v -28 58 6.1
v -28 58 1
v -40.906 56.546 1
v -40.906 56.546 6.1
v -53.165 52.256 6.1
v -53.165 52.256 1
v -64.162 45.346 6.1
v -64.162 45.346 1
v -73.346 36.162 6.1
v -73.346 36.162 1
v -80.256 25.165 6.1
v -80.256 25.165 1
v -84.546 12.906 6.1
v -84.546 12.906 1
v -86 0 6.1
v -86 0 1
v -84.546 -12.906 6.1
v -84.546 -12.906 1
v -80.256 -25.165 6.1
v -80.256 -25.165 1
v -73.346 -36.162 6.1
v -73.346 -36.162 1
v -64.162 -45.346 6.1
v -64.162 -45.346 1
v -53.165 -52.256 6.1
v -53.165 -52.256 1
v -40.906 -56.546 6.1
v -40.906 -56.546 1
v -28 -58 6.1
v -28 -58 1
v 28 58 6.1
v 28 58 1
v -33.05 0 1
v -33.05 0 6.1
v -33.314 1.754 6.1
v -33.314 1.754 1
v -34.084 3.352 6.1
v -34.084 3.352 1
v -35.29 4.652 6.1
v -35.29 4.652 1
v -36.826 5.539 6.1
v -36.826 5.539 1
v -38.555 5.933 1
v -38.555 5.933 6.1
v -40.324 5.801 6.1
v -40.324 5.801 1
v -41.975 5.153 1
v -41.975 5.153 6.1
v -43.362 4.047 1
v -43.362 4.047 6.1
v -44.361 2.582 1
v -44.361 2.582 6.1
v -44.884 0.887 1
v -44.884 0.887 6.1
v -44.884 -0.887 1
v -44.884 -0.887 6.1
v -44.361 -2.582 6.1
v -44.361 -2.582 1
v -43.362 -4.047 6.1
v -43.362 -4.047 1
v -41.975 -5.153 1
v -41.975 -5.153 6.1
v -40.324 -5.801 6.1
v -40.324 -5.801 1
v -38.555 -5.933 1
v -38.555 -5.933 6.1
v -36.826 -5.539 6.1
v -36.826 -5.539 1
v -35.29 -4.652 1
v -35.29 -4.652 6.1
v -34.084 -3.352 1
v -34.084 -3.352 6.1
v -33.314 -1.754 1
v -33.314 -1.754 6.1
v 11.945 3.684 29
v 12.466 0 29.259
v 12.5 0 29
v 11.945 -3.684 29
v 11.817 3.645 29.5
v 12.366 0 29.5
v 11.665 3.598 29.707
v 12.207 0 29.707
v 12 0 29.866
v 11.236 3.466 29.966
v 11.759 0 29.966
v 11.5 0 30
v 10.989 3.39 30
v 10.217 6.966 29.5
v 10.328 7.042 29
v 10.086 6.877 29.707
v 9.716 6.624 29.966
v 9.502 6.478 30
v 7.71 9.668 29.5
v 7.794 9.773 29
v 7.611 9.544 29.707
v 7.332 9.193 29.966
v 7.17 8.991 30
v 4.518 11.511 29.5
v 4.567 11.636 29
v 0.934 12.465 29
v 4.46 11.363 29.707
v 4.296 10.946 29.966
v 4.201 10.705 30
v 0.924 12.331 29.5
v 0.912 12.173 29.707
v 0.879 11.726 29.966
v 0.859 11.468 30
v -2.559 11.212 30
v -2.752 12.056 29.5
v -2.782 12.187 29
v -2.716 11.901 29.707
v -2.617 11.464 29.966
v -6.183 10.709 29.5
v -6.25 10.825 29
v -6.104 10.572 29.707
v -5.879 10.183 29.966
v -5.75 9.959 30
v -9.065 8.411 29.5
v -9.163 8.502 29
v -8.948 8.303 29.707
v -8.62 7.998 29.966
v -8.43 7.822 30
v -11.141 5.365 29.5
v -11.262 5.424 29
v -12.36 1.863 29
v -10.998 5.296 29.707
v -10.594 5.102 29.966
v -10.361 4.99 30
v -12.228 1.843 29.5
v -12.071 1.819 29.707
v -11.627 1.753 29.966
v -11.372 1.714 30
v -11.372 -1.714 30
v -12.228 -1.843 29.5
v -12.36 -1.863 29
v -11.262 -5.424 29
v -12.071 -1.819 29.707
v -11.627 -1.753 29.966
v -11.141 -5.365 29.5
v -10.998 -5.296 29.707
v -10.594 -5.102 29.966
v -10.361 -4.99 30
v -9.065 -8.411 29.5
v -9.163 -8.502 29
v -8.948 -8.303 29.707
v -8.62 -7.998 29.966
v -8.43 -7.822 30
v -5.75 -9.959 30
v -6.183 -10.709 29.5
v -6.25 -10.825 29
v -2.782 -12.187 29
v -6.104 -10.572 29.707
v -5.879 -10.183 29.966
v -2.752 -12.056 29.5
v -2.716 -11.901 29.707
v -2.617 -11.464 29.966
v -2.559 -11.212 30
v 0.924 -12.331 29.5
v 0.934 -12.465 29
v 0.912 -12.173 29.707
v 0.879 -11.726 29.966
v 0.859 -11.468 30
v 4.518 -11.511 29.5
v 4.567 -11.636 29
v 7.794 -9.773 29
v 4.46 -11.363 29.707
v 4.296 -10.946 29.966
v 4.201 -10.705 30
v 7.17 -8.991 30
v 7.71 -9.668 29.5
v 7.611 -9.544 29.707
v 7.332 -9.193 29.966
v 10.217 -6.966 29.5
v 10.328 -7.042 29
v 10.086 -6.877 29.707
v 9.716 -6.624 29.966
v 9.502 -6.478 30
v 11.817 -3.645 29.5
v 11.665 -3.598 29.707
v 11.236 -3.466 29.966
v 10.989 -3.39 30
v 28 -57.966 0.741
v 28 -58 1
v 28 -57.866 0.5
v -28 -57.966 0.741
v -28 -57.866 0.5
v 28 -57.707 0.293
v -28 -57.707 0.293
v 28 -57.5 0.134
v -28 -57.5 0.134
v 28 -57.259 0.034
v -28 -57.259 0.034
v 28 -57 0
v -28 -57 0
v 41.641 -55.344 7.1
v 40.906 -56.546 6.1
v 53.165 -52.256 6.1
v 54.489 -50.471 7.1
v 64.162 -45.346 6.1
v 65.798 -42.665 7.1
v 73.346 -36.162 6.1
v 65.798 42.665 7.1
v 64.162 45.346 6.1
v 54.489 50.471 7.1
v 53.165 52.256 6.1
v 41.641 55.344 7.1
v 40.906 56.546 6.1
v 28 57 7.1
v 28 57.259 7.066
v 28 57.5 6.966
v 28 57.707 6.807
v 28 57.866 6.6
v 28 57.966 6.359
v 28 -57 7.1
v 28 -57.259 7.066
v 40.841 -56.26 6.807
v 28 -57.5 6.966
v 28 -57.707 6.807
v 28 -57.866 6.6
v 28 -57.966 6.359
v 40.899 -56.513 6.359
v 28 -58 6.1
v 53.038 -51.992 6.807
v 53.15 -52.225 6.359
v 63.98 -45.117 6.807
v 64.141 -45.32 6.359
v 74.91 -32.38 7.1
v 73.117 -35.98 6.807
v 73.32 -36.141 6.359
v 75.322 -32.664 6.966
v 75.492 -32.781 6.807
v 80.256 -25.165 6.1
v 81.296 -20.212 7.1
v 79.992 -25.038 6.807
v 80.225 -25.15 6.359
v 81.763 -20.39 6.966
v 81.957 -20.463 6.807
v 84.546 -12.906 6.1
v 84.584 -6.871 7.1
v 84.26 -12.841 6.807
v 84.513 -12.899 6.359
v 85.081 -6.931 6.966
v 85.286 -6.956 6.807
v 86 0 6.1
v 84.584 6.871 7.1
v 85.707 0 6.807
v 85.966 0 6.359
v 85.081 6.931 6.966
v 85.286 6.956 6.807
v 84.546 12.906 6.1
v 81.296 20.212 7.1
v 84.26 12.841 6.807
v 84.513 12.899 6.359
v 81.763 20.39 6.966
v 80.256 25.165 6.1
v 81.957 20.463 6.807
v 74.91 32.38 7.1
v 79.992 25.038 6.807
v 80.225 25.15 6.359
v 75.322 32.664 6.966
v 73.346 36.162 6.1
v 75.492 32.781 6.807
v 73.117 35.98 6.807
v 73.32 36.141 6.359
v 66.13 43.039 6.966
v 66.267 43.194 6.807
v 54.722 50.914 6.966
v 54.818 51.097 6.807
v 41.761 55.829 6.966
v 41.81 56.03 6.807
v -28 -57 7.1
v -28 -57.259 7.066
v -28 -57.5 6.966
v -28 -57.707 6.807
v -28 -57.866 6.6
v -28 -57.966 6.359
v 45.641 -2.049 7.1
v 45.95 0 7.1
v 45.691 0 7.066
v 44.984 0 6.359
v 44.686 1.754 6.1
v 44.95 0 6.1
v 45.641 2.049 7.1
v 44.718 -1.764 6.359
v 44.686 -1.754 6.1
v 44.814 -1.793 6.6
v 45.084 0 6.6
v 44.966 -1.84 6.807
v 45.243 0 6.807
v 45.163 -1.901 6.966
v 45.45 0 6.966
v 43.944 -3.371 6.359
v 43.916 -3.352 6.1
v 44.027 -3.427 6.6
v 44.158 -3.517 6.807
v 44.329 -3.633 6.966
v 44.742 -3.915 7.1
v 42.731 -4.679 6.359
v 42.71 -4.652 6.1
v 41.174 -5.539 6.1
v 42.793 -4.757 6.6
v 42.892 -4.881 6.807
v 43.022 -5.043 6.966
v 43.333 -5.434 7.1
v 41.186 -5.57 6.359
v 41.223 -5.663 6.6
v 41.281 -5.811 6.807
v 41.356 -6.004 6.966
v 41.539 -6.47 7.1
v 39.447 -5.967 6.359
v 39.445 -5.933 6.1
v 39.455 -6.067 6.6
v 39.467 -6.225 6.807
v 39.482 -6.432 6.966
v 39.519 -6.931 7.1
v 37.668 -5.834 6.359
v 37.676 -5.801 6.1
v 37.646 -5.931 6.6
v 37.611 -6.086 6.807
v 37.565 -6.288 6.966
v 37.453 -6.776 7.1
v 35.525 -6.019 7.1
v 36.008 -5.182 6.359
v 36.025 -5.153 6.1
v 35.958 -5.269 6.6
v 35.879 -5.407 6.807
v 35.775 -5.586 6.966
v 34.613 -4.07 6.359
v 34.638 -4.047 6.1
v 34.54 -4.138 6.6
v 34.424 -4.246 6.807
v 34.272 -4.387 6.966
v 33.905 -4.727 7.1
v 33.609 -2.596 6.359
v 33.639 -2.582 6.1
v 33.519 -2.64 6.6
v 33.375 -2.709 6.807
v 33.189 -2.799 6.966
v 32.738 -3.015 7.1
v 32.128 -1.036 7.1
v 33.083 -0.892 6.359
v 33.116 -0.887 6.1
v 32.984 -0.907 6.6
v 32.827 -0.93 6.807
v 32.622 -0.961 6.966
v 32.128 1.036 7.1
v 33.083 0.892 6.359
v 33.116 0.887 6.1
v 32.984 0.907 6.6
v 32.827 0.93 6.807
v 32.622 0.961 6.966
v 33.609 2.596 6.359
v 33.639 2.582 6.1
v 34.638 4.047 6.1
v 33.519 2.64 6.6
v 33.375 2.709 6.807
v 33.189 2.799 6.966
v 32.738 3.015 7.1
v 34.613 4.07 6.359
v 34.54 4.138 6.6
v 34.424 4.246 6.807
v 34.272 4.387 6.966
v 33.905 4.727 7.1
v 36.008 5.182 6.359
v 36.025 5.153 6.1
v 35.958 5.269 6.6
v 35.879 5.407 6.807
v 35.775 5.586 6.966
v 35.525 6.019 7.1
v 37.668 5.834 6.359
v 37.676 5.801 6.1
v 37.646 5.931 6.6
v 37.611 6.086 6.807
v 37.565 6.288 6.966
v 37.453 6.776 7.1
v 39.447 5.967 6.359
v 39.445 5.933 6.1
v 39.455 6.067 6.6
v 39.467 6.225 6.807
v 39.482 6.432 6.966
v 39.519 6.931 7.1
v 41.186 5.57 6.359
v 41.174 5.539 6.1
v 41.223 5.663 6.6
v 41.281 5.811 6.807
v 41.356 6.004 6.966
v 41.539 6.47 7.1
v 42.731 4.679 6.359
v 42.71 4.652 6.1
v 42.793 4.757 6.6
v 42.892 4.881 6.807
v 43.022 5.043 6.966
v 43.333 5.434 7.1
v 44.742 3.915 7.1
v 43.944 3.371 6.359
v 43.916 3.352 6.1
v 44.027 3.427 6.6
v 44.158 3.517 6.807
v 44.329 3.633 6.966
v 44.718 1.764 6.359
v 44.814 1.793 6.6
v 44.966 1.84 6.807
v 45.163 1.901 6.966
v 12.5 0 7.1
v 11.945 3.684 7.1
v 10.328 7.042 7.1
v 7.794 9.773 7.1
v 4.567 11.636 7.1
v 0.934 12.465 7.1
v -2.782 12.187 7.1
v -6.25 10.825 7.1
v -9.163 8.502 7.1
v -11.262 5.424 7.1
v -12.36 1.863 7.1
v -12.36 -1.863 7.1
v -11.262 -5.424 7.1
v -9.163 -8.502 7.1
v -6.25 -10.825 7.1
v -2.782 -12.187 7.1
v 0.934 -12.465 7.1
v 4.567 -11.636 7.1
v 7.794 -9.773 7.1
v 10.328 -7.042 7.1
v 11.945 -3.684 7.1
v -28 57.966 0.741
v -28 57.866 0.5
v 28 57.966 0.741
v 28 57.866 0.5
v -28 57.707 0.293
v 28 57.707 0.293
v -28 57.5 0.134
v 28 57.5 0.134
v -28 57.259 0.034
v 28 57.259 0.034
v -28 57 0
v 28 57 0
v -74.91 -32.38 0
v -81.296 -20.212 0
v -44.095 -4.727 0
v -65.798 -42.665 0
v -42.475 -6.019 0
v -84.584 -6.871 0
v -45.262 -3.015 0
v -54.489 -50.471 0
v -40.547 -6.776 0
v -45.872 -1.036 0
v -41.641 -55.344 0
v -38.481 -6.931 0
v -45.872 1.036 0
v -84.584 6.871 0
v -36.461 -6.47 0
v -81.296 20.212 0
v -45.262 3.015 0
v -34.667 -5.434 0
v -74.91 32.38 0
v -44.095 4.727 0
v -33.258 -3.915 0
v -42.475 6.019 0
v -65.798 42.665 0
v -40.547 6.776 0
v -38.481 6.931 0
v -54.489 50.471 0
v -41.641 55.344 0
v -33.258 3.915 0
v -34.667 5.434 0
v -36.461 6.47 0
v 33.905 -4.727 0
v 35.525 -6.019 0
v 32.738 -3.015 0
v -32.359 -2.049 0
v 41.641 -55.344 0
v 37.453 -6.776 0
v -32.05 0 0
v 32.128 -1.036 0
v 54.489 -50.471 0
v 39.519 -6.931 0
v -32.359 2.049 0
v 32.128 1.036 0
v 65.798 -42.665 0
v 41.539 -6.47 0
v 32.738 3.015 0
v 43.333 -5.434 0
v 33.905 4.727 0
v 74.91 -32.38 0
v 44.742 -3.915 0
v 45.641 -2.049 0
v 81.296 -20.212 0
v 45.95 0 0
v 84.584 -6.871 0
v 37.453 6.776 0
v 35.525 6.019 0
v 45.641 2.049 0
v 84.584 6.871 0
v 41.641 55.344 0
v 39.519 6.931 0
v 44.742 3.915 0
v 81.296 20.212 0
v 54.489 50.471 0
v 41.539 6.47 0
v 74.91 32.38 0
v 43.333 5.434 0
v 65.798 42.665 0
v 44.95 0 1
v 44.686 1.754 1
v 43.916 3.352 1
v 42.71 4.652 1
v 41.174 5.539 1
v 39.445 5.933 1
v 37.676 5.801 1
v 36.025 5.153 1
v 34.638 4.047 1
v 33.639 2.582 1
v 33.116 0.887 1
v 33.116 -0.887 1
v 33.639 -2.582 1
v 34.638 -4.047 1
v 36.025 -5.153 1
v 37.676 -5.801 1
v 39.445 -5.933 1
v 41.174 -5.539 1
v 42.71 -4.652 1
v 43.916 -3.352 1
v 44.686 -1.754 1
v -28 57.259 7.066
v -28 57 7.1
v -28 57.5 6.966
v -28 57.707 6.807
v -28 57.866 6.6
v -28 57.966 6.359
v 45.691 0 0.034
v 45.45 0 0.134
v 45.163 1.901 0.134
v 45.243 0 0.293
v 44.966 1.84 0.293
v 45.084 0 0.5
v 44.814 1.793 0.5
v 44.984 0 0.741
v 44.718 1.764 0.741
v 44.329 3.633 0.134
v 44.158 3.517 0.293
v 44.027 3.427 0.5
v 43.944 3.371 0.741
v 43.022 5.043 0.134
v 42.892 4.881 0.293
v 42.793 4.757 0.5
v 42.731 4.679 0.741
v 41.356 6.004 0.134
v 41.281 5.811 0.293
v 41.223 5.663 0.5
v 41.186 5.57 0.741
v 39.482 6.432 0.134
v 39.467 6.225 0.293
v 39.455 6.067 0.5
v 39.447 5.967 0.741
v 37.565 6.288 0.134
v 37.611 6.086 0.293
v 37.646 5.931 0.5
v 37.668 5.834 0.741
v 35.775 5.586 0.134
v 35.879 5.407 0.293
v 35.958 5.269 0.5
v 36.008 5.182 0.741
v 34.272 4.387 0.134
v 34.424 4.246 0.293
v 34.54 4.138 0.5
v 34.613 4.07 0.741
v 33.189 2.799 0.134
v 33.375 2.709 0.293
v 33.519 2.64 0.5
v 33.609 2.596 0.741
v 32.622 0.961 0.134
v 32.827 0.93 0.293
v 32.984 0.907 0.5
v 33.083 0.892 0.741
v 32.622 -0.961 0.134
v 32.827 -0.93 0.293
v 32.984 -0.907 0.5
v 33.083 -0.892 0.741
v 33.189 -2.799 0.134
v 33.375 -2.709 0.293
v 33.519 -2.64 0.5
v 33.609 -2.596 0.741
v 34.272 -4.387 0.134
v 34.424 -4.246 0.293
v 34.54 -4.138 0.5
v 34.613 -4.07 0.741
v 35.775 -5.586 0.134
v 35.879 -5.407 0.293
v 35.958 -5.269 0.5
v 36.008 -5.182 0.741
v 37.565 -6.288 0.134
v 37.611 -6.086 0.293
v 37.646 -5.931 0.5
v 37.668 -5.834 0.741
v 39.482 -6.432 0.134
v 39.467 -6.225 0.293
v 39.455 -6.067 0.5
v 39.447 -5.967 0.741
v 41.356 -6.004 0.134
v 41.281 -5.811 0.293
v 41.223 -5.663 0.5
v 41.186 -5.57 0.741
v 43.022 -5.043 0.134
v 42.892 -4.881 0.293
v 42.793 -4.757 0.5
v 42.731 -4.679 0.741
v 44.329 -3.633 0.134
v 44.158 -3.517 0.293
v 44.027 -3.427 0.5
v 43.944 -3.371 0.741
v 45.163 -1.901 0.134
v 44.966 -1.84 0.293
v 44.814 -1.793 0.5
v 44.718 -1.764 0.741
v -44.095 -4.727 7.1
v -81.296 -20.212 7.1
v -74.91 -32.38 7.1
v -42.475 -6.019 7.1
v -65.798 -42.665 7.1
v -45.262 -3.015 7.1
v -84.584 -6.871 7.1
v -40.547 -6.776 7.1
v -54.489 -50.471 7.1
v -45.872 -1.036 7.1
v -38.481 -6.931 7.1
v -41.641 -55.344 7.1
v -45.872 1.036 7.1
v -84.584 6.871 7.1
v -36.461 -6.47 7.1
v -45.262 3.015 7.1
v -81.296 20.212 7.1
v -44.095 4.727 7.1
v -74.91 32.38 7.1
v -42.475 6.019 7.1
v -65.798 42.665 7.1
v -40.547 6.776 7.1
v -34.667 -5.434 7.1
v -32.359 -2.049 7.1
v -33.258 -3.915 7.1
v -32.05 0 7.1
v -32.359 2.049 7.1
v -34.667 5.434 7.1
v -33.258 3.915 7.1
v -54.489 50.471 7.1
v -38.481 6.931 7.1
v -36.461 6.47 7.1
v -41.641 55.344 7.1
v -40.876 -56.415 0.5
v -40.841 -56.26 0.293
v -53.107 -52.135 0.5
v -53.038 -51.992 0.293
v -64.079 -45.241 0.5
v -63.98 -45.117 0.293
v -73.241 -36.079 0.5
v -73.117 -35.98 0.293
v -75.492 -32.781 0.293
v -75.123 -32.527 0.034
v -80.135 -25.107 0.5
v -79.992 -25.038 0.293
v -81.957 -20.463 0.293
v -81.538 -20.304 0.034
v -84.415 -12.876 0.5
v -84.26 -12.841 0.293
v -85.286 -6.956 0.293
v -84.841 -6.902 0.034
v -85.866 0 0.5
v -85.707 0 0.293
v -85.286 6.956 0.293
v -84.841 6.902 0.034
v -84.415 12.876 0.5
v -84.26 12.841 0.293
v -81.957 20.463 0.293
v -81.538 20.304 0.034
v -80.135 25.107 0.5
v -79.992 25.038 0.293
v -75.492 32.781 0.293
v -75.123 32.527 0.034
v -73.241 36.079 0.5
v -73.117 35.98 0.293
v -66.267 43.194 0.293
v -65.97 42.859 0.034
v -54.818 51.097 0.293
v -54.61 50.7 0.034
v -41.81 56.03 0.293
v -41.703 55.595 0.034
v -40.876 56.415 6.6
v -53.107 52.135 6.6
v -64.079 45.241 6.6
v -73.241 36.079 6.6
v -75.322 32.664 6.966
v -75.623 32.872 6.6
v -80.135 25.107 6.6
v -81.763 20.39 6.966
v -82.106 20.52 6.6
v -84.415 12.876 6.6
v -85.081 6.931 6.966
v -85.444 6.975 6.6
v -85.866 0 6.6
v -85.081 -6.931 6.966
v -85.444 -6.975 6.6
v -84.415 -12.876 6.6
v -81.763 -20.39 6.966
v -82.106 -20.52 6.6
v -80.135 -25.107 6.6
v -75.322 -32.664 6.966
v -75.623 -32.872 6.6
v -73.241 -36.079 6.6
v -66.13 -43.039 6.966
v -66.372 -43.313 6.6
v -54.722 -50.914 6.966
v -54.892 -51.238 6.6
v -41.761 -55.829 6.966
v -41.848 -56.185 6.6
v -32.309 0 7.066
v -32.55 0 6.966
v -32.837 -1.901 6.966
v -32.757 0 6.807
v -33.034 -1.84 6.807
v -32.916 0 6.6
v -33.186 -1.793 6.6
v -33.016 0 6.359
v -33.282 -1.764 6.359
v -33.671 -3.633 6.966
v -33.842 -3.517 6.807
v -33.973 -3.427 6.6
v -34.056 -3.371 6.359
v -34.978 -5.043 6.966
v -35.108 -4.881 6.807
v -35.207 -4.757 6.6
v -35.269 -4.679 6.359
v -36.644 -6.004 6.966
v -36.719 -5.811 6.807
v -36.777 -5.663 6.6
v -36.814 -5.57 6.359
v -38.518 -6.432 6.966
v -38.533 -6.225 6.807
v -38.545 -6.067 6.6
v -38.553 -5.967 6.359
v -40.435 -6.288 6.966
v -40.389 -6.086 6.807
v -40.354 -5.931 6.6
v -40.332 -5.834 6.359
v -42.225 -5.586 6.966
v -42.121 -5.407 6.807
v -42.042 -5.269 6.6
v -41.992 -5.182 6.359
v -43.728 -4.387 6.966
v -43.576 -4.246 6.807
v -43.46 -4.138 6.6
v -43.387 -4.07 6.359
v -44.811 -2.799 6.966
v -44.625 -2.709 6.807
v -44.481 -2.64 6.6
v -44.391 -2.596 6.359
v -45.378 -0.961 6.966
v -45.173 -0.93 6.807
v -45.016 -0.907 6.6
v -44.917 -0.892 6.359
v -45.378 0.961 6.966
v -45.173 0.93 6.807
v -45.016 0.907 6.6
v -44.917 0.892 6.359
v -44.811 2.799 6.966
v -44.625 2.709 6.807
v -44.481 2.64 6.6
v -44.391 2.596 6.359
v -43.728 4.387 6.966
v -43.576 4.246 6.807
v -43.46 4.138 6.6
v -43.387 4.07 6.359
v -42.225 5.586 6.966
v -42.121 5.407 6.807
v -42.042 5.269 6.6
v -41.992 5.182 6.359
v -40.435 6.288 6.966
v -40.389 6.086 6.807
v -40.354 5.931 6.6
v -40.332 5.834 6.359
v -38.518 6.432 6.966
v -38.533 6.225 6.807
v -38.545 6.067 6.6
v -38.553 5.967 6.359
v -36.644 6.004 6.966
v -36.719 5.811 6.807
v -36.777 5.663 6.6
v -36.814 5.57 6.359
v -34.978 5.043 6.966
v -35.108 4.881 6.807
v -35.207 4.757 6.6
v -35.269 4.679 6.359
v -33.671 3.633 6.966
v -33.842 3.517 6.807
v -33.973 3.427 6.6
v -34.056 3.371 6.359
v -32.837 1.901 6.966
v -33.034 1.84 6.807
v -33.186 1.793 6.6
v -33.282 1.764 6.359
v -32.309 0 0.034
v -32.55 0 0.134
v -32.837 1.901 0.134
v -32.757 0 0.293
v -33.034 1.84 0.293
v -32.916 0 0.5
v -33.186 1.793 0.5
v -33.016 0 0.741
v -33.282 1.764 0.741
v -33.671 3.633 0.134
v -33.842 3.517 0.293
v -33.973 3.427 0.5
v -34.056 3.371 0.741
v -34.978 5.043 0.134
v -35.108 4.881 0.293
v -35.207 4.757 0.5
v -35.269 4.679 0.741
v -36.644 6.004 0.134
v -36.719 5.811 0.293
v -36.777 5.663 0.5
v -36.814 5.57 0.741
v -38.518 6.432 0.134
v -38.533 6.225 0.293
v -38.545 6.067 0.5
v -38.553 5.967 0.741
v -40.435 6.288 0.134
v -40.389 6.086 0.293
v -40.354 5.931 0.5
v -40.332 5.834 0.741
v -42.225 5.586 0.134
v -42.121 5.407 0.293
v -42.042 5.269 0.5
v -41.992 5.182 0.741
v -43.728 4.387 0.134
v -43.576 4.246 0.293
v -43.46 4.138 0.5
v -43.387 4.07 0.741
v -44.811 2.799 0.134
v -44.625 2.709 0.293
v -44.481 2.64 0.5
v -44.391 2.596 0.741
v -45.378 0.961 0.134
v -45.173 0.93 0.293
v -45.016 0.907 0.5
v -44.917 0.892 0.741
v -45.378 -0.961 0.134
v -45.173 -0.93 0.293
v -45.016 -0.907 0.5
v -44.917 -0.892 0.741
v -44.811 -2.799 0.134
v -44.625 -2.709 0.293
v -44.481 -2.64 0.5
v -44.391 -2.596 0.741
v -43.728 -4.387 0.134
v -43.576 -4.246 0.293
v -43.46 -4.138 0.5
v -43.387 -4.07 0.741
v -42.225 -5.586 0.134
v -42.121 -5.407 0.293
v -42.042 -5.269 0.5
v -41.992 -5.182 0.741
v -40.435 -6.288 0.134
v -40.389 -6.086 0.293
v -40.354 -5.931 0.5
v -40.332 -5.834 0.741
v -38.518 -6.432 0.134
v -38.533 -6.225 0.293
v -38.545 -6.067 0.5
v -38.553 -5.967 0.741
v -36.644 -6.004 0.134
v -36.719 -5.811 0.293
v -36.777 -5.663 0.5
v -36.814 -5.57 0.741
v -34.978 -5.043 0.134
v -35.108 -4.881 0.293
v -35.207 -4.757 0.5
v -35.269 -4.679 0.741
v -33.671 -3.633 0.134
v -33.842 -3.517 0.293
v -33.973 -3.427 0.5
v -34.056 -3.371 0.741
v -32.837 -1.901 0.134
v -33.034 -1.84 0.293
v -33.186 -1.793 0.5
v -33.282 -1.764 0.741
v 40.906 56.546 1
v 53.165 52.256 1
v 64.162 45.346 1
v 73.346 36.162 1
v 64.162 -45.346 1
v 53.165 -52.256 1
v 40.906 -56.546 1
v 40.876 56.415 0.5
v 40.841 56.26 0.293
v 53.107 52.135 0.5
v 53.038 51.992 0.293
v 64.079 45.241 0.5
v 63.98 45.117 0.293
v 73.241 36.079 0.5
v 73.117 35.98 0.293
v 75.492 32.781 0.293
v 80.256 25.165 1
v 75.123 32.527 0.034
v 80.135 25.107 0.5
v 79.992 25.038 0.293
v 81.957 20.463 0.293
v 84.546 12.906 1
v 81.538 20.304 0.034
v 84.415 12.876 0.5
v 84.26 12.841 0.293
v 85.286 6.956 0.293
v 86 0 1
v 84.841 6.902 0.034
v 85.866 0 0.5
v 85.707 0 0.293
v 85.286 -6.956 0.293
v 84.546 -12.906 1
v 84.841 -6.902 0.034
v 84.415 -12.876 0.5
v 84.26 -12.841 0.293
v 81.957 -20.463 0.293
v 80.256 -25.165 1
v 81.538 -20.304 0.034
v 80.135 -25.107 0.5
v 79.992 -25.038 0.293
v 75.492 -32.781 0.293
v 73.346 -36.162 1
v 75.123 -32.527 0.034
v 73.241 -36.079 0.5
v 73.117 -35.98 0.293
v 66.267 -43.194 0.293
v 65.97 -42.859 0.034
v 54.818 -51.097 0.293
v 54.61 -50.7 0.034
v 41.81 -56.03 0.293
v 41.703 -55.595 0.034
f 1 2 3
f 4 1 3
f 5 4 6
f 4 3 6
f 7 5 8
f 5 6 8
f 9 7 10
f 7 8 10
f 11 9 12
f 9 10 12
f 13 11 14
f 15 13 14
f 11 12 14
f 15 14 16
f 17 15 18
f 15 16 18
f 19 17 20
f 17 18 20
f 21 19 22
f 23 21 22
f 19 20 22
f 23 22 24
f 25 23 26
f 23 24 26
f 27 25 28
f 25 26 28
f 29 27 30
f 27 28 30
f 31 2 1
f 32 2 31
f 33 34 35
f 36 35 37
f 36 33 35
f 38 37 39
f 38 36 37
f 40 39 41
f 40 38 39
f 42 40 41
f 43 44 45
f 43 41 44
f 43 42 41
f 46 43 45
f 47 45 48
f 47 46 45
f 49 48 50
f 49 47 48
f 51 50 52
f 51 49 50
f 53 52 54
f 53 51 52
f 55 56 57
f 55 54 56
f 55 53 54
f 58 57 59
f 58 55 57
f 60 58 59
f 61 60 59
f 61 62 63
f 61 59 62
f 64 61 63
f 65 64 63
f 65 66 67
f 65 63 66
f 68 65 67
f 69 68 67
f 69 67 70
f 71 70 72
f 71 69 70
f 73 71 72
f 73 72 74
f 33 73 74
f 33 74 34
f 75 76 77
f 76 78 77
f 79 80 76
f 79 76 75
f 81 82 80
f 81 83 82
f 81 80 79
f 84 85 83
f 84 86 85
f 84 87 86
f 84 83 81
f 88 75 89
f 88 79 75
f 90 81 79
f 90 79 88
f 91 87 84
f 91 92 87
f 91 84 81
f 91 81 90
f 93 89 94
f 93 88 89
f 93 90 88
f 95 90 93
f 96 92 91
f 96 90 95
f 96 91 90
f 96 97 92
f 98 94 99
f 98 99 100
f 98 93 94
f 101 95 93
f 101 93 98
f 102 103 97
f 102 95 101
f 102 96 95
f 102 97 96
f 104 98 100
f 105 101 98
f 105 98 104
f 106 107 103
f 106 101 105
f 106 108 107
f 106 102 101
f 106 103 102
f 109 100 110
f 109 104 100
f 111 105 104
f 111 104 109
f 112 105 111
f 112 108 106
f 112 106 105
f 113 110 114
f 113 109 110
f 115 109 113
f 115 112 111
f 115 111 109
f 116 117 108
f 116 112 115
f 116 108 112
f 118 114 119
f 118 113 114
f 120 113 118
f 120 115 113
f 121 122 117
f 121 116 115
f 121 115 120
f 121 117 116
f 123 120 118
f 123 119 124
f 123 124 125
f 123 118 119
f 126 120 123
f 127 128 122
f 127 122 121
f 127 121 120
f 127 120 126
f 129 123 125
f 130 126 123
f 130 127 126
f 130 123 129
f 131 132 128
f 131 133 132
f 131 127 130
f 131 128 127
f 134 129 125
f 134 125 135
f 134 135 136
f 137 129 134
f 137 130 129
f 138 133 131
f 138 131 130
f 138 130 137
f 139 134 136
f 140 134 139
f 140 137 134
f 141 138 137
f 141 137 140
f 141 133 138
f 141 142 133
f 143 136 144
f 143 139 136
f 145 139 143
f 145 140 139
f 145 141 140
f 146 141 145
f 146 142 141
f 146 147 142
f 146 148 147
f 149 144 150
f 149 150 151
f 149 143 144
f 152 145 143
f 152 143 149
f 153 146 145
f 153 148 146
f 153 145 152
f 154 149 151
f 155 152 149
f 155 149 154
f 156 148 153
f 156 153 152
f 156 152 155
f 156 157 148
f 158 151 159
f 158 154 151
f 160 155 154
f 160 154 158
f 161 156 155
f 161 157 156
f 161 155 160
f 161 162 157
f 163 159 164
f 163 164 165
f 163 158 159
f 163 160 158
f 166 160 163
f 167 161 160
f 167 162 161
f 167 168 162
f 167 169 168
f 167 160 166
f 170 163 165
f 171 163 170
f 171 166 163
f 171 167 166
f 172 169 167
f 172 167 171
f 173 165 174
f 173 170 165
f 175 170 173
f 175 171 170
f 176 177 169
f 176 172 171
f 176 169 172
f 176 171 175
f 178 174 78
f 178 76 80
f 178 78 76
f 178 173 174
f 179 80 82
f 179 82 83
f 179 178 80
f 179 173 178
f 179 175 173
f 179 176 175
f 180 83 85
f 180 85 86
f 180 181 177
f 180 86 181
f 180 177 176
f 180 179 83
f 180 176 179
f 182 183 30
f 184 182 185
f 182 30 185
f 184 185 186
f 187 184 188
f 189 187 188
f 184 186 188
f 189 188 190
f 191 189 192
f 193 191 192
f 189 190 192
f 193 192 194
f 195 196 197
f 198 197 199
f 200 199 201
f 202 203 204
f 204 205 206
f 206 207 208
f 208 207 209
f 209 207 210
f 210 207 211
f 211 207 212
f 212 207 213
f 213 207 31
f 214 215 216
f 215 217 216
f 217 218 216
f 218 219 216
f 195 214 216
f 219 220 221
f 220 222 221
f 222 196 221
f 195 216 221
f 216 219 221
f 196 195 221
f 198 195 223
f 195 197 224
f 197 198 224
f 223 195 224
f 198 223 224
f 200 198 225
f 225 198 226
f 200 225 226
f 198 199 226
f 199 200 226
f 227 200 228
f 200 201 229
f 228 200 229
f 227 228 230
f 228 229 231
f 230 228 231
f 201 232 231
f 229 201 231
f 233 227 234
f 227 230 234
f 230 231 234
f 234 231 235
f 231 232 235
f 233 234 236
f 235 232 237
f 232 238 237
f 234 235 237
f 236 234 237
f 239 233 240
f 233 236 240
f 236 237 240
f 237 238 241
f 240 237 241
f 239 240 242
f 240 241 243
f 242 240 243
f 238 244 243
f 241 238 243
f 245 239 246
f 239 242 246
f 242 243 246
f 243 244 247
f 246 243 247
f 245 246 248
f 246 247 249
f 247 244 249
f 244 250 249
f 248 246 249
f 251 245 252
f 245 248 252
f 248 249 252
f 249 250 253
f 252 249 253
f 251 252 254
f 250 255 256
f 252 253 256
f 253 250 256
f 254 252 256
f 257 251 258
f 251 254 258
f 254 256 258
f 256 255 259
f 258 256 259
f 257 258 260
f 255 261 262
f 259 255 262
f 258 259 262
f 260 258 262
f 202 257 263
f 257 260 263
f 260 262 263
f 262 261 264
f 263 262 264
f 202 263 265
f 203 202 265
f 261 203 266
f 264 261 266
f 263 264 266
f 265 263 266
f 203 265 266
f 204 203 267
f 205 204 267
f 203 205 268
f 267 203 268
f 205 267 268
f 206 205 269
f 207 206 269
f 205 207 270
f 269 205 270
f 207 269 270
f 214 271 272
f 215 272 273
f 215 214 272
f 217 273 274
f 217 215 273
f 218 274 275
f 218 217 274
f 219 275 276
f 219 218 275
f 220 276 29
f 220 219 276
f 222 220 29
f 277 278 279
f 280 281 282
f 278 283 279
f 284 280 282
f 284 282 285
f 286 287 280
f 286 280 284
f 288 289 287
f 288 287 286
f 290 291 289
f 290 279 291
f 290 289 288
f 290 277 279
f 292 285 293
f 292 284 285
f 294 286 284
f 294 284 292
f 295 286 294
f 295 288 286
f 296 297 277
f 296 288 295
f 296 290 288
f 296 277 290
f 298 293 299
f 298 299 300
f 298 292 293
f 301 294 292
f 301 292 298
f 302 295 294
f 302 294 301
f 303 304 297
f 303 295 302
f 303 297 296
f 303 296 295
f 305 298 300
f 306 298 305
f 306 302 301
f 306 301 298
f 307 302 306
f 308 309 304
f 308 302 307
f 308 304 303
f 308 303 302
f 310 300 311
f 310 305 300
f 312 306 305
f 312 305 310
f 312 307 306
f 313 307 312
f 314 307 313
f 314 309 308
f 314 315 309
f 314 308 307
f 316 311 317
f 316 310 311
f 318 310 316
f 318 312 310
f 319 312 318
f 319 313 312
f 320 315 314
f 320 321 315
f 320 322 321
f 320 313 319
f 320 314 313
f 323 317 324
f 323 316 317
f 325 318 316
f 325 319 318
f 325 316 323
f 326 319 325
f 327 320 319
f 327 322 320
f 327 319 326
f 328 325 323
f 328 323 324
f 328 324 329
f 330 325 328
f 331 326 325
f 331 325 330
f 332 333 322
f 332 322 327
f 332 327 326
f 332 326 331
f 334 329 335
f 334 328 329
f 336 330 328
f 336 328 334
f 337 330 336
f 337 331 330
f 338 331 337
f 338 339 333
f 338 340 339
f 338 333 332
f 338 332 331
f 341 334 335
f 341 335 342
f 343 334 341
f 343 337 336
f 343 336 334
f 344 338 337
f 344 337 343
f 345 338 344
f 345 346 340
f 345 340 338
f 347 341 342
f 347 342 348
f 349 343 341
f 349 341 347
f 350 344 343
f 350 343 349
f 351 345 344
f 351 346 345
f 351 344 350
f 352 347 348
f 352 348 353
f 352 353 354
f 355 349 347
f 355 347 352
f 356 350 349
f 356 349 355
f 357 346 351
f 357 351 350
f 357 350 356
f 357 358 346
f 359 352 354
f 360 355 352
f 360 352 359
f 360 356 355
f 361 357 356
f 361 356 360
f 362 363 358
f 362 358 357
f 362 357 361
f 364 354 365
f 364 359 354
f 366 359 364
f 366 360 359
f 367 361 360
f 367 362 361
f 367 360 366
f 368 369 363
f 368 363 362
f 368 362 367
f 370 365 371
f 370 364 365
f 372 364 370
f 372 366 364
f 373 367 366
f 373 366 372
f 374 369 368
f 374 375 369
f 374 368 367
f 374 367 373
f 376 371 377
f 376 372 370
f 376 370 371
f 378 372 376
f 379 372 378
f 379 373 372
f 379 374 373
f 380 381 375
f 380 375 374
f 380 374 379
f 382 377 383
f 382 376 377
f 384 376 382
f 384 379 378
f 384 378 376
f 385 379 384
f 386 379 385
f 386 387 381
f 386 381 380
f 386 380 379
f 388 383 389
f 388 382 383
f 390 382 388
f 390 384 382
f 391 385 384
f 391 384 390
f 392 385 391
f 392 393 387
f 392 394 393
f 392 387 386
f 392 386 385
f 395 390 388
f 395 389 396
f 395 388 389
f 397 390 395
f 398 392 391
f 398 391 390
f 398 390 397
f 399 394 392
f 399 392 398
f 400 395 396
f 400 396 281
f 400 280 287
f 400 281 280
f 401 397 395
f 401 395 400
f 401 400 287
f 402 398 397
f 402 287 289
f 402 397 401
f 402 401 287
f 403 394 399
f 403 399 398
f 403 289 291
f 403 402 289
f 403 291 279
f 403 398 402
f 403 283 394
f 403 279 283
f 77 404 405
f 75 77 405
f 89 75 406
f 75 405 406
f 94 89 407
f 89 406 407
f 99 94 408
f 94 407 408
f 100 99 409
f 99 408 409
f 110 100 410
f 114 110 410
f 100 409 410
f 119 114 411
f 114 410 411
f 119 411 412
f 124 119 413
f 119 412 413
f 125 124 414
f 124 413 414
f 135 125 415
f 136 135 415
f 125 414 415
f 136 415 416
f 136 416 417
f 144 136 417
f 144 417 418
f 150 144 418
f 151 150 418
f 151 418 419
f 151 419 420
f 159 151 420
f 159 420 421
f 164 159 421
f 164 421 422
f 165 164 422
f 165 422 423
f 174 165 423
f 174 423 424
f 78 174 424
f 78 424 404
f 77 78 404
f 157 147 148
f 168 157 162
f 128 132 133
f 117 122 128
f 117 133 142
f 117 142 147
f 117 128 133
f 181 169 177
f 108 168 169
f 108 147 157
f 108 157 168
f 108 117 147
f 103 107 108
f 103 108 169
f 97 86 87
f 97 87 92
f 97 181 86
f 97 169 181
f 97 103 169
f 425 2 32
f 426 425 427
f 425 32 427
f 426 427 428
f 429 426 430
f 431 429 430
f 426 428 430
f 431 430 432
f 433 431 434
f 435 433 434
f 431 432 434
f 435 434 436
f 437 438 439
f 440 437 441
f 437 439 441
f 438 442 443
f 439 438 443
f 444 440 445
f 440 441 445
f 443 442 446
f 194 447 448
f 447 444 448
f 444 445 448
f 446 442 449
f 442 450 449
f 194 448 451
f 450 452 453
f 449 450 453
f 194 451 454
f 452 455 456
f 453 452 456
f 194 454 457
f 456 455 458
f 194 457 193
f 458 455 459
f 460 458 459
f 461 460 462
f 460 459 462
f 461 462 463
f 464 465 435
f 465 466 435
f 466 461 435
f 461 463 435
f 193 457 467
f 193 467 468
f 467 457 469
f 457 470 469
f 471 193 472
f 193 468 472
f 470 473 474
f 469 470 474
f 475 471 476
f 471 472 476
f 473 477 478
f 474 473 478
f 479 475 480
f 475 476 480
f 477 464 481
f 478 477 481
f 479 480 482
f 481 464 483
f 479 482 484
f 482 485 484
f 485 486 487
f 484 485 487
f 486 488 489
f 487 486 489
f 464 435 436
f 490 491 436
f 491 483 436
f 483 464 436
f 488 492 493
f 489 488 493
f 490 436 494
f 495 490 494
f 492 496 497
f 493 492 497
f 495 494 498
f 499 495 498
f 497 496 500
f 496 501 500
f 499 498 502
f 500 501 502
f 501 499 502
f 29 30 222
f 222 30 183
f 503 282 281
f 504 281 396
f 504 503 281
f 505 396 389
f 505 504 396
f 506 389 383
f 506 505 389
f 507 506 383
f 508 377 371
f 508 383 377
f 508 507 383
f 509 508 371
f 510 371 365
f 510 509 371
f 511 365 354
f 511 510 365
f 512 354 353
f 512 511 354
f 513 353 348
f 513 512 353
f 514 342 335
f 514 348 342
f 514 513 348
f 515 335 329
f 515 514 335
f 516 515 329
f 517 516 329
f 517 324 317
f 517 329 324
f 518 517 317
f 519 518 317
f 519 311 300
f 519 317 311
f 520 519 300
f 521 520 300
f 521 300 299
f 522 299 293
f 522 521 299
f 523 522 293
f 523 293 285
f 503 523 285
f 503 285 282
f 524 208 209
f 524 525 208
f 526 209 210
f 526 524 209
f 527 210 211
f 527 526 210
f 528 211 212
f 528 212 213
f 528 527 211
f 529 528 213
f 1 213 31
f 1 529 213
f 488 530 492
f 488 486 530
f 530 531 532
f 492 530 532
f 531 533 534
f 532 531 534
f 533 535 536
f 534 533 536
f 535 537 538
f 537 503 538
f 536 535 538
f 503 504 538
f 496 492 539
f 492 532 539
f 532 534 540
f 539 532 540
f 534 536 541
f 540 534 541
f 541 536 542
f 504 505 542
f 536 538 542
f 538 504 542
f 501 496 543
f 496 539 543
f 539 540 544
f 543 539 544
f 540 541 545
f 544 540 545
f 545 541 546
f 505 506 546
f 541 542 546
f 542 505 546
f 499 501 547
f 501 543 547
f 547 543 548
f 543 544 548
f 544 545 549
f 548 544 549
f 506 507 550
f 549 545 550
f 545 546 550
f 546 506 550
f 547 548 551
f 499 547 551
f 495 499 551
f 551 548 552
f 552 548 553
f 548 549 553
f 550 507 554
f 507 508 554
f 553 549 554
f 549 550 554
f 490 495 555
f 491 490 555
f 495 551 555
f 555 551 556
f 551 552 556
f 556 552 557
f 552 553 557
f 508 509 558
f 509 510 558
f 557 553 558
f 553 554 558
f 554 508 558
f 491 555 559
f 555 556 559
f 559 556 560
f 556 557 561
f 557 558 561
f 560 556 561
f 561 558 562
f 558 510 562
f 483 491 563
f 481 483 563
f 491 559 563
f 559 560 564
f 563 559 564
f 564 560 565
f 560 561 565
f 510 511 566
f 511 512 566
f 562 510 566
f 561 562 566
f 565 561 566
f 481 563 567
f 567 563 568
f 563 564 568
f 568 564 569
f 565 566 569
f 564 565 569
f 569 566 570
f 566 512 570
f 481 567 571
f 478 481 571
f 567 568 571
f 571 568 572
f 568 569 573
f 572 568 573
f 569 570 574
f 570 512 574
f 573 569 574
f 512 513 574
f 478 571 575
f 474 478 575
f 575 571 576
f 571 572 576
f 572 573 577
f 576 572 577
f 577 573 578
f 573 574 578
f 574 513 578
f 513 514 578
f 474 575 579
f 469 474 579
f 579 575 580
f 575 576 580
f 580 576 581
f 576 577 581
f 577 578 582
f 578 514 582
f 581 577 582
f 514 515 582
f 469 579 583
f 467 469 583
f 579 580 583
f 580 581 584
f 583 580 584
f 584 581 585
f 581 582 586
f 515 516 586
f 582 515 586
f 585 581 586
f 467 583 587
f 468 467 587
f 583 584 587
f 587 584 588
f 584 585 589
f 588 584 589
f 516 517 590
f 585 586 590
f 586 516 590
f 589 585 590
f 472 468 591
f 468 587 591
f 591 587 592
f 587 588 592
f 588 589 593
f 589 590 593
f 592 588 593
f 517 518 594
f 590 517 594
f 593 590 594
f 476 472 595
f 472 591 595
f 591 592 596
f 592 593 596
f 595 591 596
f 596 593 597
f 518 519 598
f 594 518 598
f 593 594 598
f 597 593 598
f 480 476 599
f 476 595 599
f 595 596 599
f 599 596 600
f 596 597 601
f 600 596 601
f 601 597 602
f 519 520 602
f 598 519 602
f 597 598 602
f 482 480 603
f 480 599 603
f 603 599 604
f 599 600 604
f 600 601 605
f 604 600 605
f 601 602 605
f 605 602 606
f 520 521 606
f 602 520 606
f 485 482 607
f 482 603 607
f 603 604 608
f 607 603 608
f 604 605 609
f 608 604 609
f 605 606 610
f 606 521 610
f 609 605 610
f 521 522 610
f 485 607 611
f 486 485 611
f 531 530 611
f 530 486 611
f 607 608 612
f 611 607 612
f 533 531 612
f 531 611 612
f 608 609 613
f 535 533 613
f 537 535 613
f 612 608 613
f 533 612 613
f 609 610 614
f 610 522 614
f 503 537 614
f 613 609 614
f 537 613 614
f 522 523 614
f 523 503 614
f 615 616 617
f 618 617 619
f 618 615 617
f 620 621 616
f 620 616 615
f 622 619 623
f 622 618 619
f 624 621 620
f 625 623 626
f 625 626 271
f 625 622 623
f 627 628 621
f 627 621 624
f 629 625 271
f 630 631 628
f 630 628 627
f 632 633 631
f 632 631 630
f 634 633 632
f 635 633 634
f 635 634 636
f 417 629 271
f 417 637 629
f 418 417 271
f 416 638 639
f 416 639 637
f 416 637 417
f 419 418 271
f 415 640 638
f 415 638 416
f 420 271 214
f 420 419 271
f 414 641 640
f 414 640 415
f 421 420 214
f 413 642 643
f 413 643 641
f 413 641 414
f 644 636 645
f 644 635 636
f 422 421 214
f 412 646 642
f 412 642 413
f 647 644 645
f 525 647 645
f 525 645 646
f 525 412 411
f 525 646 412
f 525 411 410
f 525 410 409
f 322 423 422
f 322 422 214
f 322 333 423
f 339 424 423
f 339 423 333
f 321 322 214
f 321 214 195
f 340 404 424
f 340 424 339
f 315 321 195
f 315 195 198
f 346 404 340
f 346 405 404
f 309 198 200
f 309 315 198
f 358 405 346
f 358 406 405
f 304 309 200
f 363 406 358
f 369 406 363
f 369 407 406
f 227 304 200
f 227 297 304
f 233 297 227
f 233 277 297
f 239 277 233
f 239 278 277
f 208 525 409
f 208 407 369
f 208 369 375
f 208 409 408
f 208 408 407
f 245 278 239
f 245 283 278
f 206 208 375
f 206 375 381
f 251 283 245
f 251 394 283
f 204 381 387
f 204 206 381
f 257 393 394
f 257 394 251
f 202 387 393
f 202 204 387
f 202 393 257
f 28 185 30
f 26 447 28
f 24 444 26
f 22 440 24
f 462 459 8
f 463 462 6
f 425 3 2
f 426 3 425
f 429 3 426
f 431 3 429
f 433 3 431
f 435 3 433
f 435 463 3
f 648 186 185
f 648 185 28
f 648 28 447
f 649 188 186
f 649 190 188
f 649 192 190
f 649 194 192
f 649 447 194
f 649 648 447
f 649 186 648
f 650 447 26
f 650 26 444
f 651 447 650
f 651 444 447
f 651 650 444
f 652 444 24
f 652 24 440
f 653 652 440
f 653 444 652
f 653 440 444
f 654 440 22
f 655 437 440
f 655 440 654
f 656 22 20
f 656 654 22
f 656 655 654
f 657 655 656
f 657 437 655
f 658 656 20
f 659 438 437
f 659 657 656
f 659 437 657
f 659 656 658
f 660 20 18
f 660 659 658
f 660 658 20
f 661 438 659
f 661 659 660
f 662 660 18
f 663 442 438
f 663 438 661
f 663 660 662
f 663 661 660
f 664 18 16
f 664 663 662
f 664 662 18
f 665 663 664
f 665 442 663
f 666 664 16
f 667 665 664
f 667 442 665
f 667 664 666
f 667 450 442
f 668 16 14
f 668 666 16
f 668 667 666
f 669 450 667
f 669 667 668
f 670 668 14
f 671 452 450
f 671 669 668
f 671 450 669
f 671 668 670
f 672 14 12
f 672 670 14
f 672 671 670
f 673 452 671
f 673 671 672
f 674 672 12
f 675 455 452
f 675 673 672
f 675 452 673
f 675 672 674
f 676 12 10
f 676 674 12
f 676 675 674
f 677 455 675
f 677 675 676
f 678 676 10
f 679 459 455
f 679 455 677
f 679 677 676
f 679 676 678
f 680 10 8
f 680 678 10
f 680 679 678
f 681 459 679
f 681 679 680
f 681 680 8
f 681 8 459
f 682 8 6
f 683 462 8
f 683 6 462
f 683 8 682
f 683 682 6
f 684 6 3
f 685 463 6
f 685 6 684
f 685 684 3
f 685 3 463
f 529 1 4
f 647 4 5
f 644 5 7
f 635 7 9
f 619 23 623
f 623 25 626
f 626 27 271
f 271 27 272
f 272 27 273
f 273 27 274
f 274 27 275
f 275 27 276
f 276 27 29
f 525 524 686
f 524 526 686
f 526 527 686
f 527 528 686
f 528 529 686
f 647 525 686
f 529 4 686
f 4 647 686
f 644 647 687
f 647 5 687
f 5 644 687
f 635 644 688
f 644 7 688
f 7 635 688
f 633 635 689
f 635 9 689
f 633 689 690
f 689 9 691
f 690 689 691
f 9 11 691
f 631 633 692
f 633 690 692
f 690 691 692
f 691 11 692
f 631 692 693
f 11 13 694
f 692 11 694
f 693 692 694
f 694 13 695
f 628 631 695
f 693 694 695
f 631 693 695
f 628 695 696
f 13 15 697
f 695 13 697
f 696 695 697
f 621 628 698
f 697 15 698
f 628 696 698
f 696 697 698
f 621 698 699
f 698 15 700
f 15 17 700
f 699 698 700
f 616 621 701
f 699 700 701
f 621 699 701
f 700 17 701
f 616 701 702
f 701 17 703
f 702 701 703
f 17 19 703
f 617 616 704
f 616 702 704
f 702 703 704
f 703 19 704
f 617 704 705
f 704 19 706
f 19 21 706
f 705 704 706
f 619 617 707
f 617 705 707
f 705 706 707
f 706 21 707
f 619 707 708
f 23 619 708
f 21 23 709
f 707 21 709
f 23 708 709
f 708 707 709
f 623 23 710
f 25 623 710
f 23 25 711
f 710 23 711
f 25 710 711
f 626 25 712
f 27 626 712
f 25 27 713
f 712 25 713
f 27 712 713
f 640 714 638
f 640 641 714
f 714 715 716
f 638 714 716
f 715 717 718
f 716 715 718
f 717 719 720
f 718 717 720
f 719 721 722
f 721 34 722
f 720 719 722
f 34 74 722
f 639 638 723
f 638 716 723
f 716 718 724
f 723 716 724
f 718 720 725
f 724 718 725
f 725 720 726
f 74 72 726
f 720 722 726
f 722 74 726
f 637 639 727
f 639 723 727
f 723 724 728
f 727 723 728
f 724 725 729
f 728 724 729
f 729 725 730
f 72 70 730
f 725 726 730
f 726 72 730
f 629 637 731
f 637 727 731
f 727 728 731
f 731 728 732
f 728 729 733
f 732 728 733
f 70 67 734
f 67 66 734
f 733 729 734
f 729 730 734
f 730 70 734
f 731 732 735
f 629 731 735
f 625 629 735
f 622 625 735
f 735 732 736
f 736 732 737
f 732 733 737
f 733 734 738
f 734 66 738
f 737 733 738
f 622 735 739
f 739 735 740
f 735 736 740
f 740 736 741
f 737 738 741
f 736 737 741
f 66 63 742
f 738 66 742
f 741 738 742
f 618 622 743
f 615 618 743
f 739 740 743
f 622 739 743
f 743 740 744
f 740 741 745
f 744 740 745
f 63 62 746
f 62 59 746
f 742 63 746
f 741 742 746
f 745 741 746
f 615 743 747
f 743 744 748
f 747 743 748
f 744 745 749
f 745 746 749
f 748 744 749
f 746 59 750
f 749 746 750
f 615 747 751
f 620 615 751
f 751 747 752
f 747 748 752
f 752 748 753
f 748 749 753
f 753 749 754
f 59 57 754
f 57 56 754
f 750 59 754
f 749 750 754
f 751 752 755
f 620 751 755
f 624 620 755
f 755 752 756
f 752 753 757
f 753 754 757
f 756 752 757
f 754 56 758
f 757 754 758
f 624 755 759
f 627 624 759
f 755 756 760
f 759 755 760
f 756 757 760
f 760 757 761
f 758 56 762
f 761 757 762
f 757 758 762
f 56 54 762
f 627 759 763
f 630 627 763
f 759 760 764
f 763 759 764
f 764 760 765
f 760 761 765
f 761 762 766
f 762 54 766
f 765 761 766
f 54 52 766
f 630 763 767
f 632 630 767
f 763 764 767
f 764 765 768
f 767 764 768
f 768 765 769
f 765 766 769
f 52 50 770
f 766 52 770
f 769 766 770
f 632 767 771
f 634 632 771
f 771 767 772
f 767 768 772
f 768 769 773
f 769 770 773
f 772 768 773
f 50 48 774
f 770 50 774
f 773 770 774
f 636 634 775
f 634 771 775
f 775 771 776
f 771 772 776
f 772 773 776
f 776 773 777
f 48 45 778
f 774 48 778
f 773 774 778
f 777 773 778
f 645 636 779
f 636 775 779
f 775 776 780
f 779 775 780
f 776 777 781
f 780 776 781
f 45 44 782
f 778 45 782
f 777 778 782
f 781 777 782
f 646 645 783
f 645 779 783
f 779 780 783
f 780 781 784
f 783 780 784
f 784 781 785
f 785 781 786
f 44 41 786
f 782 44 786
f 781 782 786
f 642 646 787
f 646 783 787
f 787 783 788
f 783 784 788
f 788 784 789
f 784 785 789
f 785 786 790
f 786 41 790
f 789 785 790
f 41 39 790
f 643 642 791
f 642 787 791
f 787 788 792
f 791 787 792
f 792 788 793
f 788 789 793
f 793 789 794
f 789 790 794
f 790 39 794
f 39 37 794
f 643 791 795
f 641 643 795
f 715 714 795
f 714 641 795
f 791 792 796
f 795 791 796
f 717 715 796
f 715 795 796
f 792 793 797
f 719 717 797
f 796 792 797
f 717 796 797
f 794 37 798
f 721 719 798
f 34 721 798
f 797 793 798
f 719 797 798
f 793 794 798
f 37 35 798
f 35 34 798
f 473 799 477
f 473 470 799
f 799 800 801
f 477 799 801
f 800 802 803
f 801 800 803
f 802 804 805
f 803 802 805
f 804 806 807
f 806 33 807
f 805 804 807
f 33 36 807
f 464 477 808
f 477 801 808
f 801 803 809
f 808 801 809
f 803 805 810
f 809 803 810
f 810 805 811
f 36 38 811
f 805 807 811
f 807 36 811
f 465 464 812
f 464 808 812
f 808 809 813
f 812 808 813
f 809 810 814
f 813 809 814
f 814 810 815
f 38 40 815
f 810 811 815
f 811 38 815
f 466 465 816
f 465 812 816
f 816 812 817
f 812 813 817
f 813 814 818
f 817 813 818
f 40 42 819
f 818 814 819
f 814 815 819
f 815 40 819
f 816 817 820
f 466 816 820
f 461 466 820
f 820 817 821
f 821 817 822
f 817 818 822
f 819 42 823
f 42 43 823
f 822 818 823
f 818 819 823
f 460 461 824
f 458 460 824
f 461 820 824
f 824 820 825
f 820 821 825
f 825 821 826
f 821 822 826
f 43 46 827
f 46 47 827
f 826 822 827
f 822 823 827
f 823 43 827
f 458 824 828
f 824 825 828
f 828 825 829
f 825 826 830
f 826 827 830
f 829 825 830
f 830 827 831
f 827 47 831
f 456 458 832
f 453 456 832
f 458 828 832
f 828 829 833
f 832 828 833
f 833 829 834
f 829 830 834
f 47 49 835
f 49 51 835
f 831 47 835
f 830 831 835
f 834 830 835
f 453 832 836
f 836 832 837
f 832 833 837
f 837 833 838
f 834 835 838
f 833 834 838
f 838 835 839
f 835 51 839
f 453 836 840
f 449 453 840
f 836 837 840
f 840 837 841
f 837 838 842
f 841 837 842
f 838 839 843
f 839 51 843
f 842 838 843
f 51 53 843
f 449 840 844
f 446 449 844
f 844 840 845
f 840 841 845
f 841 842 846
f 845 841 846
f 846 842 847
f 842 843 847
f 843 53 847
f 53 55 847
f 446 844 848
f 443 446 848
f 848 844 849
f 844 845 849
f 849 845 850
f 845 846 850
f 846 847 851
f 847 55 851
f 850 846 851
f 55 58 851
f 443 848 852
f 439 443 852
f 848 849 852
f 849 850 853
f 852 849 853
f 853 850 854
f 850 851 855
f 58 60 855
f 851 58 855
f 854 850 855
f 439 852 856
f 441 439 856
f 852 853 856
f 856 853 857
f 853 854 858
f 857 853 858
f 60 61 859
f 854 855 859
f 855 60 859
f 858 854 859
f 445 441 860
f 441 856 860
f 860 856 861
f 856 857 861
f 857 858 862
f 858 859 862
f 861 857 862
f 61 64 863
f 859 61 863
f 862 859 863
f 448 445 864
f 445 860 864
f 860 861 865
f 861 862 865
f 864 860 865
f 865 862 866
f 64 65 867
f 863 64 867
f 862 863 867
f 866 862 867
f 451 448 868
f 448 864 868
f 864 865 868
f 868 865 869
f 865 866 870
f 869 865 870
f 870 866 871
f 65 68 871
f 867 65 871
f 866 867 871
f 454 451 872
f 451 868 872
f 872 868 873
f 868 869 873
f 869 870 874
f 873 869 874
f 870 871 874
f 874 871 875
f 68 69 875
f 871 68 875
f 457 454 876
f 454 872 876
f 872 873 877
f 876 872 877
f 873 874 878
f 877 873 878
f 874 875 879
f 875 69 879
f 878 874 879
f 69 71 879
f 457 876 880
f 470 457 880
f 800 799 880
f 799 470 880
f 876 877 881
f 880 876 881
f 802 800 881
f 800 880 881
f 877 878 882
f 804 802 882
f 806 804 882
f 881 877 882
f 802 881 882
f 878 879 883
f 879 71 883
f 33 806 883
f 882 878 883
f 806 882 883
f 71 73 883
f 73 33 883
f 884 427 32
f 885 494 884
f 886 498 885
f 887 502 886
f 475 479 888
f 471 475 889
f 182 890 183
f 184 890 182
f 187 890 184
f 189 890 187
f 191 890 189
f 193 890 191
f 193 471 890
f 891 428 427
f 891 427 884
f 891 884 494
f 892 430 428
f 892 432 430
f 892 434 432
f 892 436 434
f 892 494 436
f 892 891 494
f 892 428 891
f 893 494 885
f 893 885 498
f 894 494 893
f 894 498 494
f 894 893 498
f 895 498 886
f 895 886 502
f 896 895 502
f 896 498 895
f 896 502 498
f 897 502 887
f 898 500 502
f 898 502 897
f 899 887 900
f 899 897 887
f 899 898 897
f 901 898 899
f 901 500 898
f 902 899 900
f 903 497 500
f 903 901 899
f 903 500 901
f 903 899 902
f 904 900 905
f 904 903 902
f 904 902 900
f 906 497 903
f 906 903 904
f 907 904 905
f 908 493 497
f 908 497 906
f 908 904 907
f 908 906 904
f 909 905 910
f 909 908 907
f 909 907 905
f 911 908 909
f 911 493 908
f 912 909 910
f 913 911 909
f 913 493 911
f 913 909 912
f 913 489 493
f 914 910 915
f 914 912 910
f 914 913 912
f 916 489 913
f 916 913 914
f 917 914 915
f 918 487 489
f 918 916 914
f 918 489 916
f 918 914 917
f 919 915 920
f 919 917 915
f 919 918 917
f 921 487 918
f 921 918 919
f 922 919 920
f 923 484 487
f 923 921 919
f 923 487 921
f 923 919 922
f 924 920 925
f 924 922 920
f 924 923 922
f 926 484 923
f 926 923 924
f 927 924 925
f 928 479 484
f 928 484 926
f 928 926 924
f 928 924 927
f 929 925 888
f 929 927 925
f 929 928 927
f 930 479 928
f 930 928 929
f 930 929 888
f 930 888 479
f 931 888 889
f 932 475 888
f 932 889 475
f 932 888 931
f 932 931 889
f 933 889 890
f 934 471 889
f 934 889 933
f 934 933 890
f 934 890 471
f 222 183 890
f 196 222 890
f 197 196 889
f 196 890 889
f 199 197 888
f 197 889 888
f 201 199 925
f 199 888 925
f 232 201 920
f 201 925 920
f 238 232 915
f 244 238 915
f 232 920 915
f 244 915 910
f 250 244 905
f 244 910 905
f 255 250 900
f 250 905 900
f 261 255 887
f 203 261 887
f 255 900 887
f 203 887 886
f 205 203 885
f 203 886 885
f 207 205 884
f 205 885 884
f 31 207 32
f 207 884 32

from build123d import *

# Parameters (mm, degrees)
PAD_DEPTH    = 7.1
SKETCH001_R  = 5.95
POCKET_DEPTH = 7.101
SKETCH004_R  = 12.5
PAD001_DEPTH = 30
FILLET_R     = 1
FILLET001_R  = 1
FILLET002_R  = 1
FILLET003_R  = 1
FILLET004_R  = 1
FILLET005_R  = 1
FILLET006_R  = 1


with BuildPart() as part:
    # Sketch → Pad (new body)
    with BuildSketch(Plane.XY):
        with BuildLine():
            ThreePointArc((-28, 58), (-86, 0), (-28, -58))
            Line((-28, -58), (28, -58))
            ThreePointArc((28, -58), (86, 0), (28, 58))
            Line((-28, 58), (28, 58))
        make_face()
    extrude(amount=PAD_DEPTH)

    # Sketch001 → Pocket (cut, through all)
    with BuildSketch(Plane.XY):
        with Locations((39, 0)):
            Circle(SKETCH001_R)
        with Locations((-39, 0)):
            Circle(SKETCH001_R)
    extrude(amount=POCKET_DEPTH, mode=Mode.SUBTRACT)

    # Sketch004 → Pad001 (join)
    with BuildSketch(Plane.XY):
        Circle(SKETCH004_R)
    extrude(amount=PAD001_DEPTH)

    # Fillet
    fillet_edges = [part.edges().sort_by_distance(p)[0] for p in [
        (-12.5, 0, 30),
    ]]
    fillet(fillet_edges, radius=FILLET_R)

    # Fillet001
    fillet001_edges = [part.edges().sort_by_distance(p)[0] for p in [
        (-86, 0, 7.1),
        (0, 58, 7.1),
        (86, 0, 7.1),
        (0, -58, 7.1),
    ]]
    fillet(fillet001_edges, radius=FILLET001_R)

    # Fillet002
    fillet002_edges = [part.edges().sort_by_distance(p)[0] for p in [
        (0, 58, 0),
        (-86, 0, 0),
        (0, -58, 0),
        (86, 0, 0),
    ]]
    fillet(fillet002_edges, radius=FILLET002_R)

    # Fillet003
    fillet003_edges = [part.edges().sort_by_distance(p)[0] for p in [
        (33.05, 0, 0),
    ]]
    fillet(fillet003_edges, radius=FILLET003_R)

    # Fillet004
    fillet004_edges = [part.edges().sort_by_distance(p)[0] for p in [
        (-44.95, 0, 0),
    ]]
    fillet(fillet004_edges, radius=FILLET004_R)

    # Fillet005
    fillet005_edges = [part.edges().sort_by_distance(p)[0] for p in [
        (33.05, 0, 7.1),
    ]]
    fillet(fillet005_edges, radius=FILLET005_R)

    # Fillet006
    fillet006_edges = [part.edges().sort_by_distance(p)[0] for p in [
        (-44.95, 0, 7.1),
    ]]
    fillet(fillet006_edges, radius=FILLET006_R)


solid = part.part
